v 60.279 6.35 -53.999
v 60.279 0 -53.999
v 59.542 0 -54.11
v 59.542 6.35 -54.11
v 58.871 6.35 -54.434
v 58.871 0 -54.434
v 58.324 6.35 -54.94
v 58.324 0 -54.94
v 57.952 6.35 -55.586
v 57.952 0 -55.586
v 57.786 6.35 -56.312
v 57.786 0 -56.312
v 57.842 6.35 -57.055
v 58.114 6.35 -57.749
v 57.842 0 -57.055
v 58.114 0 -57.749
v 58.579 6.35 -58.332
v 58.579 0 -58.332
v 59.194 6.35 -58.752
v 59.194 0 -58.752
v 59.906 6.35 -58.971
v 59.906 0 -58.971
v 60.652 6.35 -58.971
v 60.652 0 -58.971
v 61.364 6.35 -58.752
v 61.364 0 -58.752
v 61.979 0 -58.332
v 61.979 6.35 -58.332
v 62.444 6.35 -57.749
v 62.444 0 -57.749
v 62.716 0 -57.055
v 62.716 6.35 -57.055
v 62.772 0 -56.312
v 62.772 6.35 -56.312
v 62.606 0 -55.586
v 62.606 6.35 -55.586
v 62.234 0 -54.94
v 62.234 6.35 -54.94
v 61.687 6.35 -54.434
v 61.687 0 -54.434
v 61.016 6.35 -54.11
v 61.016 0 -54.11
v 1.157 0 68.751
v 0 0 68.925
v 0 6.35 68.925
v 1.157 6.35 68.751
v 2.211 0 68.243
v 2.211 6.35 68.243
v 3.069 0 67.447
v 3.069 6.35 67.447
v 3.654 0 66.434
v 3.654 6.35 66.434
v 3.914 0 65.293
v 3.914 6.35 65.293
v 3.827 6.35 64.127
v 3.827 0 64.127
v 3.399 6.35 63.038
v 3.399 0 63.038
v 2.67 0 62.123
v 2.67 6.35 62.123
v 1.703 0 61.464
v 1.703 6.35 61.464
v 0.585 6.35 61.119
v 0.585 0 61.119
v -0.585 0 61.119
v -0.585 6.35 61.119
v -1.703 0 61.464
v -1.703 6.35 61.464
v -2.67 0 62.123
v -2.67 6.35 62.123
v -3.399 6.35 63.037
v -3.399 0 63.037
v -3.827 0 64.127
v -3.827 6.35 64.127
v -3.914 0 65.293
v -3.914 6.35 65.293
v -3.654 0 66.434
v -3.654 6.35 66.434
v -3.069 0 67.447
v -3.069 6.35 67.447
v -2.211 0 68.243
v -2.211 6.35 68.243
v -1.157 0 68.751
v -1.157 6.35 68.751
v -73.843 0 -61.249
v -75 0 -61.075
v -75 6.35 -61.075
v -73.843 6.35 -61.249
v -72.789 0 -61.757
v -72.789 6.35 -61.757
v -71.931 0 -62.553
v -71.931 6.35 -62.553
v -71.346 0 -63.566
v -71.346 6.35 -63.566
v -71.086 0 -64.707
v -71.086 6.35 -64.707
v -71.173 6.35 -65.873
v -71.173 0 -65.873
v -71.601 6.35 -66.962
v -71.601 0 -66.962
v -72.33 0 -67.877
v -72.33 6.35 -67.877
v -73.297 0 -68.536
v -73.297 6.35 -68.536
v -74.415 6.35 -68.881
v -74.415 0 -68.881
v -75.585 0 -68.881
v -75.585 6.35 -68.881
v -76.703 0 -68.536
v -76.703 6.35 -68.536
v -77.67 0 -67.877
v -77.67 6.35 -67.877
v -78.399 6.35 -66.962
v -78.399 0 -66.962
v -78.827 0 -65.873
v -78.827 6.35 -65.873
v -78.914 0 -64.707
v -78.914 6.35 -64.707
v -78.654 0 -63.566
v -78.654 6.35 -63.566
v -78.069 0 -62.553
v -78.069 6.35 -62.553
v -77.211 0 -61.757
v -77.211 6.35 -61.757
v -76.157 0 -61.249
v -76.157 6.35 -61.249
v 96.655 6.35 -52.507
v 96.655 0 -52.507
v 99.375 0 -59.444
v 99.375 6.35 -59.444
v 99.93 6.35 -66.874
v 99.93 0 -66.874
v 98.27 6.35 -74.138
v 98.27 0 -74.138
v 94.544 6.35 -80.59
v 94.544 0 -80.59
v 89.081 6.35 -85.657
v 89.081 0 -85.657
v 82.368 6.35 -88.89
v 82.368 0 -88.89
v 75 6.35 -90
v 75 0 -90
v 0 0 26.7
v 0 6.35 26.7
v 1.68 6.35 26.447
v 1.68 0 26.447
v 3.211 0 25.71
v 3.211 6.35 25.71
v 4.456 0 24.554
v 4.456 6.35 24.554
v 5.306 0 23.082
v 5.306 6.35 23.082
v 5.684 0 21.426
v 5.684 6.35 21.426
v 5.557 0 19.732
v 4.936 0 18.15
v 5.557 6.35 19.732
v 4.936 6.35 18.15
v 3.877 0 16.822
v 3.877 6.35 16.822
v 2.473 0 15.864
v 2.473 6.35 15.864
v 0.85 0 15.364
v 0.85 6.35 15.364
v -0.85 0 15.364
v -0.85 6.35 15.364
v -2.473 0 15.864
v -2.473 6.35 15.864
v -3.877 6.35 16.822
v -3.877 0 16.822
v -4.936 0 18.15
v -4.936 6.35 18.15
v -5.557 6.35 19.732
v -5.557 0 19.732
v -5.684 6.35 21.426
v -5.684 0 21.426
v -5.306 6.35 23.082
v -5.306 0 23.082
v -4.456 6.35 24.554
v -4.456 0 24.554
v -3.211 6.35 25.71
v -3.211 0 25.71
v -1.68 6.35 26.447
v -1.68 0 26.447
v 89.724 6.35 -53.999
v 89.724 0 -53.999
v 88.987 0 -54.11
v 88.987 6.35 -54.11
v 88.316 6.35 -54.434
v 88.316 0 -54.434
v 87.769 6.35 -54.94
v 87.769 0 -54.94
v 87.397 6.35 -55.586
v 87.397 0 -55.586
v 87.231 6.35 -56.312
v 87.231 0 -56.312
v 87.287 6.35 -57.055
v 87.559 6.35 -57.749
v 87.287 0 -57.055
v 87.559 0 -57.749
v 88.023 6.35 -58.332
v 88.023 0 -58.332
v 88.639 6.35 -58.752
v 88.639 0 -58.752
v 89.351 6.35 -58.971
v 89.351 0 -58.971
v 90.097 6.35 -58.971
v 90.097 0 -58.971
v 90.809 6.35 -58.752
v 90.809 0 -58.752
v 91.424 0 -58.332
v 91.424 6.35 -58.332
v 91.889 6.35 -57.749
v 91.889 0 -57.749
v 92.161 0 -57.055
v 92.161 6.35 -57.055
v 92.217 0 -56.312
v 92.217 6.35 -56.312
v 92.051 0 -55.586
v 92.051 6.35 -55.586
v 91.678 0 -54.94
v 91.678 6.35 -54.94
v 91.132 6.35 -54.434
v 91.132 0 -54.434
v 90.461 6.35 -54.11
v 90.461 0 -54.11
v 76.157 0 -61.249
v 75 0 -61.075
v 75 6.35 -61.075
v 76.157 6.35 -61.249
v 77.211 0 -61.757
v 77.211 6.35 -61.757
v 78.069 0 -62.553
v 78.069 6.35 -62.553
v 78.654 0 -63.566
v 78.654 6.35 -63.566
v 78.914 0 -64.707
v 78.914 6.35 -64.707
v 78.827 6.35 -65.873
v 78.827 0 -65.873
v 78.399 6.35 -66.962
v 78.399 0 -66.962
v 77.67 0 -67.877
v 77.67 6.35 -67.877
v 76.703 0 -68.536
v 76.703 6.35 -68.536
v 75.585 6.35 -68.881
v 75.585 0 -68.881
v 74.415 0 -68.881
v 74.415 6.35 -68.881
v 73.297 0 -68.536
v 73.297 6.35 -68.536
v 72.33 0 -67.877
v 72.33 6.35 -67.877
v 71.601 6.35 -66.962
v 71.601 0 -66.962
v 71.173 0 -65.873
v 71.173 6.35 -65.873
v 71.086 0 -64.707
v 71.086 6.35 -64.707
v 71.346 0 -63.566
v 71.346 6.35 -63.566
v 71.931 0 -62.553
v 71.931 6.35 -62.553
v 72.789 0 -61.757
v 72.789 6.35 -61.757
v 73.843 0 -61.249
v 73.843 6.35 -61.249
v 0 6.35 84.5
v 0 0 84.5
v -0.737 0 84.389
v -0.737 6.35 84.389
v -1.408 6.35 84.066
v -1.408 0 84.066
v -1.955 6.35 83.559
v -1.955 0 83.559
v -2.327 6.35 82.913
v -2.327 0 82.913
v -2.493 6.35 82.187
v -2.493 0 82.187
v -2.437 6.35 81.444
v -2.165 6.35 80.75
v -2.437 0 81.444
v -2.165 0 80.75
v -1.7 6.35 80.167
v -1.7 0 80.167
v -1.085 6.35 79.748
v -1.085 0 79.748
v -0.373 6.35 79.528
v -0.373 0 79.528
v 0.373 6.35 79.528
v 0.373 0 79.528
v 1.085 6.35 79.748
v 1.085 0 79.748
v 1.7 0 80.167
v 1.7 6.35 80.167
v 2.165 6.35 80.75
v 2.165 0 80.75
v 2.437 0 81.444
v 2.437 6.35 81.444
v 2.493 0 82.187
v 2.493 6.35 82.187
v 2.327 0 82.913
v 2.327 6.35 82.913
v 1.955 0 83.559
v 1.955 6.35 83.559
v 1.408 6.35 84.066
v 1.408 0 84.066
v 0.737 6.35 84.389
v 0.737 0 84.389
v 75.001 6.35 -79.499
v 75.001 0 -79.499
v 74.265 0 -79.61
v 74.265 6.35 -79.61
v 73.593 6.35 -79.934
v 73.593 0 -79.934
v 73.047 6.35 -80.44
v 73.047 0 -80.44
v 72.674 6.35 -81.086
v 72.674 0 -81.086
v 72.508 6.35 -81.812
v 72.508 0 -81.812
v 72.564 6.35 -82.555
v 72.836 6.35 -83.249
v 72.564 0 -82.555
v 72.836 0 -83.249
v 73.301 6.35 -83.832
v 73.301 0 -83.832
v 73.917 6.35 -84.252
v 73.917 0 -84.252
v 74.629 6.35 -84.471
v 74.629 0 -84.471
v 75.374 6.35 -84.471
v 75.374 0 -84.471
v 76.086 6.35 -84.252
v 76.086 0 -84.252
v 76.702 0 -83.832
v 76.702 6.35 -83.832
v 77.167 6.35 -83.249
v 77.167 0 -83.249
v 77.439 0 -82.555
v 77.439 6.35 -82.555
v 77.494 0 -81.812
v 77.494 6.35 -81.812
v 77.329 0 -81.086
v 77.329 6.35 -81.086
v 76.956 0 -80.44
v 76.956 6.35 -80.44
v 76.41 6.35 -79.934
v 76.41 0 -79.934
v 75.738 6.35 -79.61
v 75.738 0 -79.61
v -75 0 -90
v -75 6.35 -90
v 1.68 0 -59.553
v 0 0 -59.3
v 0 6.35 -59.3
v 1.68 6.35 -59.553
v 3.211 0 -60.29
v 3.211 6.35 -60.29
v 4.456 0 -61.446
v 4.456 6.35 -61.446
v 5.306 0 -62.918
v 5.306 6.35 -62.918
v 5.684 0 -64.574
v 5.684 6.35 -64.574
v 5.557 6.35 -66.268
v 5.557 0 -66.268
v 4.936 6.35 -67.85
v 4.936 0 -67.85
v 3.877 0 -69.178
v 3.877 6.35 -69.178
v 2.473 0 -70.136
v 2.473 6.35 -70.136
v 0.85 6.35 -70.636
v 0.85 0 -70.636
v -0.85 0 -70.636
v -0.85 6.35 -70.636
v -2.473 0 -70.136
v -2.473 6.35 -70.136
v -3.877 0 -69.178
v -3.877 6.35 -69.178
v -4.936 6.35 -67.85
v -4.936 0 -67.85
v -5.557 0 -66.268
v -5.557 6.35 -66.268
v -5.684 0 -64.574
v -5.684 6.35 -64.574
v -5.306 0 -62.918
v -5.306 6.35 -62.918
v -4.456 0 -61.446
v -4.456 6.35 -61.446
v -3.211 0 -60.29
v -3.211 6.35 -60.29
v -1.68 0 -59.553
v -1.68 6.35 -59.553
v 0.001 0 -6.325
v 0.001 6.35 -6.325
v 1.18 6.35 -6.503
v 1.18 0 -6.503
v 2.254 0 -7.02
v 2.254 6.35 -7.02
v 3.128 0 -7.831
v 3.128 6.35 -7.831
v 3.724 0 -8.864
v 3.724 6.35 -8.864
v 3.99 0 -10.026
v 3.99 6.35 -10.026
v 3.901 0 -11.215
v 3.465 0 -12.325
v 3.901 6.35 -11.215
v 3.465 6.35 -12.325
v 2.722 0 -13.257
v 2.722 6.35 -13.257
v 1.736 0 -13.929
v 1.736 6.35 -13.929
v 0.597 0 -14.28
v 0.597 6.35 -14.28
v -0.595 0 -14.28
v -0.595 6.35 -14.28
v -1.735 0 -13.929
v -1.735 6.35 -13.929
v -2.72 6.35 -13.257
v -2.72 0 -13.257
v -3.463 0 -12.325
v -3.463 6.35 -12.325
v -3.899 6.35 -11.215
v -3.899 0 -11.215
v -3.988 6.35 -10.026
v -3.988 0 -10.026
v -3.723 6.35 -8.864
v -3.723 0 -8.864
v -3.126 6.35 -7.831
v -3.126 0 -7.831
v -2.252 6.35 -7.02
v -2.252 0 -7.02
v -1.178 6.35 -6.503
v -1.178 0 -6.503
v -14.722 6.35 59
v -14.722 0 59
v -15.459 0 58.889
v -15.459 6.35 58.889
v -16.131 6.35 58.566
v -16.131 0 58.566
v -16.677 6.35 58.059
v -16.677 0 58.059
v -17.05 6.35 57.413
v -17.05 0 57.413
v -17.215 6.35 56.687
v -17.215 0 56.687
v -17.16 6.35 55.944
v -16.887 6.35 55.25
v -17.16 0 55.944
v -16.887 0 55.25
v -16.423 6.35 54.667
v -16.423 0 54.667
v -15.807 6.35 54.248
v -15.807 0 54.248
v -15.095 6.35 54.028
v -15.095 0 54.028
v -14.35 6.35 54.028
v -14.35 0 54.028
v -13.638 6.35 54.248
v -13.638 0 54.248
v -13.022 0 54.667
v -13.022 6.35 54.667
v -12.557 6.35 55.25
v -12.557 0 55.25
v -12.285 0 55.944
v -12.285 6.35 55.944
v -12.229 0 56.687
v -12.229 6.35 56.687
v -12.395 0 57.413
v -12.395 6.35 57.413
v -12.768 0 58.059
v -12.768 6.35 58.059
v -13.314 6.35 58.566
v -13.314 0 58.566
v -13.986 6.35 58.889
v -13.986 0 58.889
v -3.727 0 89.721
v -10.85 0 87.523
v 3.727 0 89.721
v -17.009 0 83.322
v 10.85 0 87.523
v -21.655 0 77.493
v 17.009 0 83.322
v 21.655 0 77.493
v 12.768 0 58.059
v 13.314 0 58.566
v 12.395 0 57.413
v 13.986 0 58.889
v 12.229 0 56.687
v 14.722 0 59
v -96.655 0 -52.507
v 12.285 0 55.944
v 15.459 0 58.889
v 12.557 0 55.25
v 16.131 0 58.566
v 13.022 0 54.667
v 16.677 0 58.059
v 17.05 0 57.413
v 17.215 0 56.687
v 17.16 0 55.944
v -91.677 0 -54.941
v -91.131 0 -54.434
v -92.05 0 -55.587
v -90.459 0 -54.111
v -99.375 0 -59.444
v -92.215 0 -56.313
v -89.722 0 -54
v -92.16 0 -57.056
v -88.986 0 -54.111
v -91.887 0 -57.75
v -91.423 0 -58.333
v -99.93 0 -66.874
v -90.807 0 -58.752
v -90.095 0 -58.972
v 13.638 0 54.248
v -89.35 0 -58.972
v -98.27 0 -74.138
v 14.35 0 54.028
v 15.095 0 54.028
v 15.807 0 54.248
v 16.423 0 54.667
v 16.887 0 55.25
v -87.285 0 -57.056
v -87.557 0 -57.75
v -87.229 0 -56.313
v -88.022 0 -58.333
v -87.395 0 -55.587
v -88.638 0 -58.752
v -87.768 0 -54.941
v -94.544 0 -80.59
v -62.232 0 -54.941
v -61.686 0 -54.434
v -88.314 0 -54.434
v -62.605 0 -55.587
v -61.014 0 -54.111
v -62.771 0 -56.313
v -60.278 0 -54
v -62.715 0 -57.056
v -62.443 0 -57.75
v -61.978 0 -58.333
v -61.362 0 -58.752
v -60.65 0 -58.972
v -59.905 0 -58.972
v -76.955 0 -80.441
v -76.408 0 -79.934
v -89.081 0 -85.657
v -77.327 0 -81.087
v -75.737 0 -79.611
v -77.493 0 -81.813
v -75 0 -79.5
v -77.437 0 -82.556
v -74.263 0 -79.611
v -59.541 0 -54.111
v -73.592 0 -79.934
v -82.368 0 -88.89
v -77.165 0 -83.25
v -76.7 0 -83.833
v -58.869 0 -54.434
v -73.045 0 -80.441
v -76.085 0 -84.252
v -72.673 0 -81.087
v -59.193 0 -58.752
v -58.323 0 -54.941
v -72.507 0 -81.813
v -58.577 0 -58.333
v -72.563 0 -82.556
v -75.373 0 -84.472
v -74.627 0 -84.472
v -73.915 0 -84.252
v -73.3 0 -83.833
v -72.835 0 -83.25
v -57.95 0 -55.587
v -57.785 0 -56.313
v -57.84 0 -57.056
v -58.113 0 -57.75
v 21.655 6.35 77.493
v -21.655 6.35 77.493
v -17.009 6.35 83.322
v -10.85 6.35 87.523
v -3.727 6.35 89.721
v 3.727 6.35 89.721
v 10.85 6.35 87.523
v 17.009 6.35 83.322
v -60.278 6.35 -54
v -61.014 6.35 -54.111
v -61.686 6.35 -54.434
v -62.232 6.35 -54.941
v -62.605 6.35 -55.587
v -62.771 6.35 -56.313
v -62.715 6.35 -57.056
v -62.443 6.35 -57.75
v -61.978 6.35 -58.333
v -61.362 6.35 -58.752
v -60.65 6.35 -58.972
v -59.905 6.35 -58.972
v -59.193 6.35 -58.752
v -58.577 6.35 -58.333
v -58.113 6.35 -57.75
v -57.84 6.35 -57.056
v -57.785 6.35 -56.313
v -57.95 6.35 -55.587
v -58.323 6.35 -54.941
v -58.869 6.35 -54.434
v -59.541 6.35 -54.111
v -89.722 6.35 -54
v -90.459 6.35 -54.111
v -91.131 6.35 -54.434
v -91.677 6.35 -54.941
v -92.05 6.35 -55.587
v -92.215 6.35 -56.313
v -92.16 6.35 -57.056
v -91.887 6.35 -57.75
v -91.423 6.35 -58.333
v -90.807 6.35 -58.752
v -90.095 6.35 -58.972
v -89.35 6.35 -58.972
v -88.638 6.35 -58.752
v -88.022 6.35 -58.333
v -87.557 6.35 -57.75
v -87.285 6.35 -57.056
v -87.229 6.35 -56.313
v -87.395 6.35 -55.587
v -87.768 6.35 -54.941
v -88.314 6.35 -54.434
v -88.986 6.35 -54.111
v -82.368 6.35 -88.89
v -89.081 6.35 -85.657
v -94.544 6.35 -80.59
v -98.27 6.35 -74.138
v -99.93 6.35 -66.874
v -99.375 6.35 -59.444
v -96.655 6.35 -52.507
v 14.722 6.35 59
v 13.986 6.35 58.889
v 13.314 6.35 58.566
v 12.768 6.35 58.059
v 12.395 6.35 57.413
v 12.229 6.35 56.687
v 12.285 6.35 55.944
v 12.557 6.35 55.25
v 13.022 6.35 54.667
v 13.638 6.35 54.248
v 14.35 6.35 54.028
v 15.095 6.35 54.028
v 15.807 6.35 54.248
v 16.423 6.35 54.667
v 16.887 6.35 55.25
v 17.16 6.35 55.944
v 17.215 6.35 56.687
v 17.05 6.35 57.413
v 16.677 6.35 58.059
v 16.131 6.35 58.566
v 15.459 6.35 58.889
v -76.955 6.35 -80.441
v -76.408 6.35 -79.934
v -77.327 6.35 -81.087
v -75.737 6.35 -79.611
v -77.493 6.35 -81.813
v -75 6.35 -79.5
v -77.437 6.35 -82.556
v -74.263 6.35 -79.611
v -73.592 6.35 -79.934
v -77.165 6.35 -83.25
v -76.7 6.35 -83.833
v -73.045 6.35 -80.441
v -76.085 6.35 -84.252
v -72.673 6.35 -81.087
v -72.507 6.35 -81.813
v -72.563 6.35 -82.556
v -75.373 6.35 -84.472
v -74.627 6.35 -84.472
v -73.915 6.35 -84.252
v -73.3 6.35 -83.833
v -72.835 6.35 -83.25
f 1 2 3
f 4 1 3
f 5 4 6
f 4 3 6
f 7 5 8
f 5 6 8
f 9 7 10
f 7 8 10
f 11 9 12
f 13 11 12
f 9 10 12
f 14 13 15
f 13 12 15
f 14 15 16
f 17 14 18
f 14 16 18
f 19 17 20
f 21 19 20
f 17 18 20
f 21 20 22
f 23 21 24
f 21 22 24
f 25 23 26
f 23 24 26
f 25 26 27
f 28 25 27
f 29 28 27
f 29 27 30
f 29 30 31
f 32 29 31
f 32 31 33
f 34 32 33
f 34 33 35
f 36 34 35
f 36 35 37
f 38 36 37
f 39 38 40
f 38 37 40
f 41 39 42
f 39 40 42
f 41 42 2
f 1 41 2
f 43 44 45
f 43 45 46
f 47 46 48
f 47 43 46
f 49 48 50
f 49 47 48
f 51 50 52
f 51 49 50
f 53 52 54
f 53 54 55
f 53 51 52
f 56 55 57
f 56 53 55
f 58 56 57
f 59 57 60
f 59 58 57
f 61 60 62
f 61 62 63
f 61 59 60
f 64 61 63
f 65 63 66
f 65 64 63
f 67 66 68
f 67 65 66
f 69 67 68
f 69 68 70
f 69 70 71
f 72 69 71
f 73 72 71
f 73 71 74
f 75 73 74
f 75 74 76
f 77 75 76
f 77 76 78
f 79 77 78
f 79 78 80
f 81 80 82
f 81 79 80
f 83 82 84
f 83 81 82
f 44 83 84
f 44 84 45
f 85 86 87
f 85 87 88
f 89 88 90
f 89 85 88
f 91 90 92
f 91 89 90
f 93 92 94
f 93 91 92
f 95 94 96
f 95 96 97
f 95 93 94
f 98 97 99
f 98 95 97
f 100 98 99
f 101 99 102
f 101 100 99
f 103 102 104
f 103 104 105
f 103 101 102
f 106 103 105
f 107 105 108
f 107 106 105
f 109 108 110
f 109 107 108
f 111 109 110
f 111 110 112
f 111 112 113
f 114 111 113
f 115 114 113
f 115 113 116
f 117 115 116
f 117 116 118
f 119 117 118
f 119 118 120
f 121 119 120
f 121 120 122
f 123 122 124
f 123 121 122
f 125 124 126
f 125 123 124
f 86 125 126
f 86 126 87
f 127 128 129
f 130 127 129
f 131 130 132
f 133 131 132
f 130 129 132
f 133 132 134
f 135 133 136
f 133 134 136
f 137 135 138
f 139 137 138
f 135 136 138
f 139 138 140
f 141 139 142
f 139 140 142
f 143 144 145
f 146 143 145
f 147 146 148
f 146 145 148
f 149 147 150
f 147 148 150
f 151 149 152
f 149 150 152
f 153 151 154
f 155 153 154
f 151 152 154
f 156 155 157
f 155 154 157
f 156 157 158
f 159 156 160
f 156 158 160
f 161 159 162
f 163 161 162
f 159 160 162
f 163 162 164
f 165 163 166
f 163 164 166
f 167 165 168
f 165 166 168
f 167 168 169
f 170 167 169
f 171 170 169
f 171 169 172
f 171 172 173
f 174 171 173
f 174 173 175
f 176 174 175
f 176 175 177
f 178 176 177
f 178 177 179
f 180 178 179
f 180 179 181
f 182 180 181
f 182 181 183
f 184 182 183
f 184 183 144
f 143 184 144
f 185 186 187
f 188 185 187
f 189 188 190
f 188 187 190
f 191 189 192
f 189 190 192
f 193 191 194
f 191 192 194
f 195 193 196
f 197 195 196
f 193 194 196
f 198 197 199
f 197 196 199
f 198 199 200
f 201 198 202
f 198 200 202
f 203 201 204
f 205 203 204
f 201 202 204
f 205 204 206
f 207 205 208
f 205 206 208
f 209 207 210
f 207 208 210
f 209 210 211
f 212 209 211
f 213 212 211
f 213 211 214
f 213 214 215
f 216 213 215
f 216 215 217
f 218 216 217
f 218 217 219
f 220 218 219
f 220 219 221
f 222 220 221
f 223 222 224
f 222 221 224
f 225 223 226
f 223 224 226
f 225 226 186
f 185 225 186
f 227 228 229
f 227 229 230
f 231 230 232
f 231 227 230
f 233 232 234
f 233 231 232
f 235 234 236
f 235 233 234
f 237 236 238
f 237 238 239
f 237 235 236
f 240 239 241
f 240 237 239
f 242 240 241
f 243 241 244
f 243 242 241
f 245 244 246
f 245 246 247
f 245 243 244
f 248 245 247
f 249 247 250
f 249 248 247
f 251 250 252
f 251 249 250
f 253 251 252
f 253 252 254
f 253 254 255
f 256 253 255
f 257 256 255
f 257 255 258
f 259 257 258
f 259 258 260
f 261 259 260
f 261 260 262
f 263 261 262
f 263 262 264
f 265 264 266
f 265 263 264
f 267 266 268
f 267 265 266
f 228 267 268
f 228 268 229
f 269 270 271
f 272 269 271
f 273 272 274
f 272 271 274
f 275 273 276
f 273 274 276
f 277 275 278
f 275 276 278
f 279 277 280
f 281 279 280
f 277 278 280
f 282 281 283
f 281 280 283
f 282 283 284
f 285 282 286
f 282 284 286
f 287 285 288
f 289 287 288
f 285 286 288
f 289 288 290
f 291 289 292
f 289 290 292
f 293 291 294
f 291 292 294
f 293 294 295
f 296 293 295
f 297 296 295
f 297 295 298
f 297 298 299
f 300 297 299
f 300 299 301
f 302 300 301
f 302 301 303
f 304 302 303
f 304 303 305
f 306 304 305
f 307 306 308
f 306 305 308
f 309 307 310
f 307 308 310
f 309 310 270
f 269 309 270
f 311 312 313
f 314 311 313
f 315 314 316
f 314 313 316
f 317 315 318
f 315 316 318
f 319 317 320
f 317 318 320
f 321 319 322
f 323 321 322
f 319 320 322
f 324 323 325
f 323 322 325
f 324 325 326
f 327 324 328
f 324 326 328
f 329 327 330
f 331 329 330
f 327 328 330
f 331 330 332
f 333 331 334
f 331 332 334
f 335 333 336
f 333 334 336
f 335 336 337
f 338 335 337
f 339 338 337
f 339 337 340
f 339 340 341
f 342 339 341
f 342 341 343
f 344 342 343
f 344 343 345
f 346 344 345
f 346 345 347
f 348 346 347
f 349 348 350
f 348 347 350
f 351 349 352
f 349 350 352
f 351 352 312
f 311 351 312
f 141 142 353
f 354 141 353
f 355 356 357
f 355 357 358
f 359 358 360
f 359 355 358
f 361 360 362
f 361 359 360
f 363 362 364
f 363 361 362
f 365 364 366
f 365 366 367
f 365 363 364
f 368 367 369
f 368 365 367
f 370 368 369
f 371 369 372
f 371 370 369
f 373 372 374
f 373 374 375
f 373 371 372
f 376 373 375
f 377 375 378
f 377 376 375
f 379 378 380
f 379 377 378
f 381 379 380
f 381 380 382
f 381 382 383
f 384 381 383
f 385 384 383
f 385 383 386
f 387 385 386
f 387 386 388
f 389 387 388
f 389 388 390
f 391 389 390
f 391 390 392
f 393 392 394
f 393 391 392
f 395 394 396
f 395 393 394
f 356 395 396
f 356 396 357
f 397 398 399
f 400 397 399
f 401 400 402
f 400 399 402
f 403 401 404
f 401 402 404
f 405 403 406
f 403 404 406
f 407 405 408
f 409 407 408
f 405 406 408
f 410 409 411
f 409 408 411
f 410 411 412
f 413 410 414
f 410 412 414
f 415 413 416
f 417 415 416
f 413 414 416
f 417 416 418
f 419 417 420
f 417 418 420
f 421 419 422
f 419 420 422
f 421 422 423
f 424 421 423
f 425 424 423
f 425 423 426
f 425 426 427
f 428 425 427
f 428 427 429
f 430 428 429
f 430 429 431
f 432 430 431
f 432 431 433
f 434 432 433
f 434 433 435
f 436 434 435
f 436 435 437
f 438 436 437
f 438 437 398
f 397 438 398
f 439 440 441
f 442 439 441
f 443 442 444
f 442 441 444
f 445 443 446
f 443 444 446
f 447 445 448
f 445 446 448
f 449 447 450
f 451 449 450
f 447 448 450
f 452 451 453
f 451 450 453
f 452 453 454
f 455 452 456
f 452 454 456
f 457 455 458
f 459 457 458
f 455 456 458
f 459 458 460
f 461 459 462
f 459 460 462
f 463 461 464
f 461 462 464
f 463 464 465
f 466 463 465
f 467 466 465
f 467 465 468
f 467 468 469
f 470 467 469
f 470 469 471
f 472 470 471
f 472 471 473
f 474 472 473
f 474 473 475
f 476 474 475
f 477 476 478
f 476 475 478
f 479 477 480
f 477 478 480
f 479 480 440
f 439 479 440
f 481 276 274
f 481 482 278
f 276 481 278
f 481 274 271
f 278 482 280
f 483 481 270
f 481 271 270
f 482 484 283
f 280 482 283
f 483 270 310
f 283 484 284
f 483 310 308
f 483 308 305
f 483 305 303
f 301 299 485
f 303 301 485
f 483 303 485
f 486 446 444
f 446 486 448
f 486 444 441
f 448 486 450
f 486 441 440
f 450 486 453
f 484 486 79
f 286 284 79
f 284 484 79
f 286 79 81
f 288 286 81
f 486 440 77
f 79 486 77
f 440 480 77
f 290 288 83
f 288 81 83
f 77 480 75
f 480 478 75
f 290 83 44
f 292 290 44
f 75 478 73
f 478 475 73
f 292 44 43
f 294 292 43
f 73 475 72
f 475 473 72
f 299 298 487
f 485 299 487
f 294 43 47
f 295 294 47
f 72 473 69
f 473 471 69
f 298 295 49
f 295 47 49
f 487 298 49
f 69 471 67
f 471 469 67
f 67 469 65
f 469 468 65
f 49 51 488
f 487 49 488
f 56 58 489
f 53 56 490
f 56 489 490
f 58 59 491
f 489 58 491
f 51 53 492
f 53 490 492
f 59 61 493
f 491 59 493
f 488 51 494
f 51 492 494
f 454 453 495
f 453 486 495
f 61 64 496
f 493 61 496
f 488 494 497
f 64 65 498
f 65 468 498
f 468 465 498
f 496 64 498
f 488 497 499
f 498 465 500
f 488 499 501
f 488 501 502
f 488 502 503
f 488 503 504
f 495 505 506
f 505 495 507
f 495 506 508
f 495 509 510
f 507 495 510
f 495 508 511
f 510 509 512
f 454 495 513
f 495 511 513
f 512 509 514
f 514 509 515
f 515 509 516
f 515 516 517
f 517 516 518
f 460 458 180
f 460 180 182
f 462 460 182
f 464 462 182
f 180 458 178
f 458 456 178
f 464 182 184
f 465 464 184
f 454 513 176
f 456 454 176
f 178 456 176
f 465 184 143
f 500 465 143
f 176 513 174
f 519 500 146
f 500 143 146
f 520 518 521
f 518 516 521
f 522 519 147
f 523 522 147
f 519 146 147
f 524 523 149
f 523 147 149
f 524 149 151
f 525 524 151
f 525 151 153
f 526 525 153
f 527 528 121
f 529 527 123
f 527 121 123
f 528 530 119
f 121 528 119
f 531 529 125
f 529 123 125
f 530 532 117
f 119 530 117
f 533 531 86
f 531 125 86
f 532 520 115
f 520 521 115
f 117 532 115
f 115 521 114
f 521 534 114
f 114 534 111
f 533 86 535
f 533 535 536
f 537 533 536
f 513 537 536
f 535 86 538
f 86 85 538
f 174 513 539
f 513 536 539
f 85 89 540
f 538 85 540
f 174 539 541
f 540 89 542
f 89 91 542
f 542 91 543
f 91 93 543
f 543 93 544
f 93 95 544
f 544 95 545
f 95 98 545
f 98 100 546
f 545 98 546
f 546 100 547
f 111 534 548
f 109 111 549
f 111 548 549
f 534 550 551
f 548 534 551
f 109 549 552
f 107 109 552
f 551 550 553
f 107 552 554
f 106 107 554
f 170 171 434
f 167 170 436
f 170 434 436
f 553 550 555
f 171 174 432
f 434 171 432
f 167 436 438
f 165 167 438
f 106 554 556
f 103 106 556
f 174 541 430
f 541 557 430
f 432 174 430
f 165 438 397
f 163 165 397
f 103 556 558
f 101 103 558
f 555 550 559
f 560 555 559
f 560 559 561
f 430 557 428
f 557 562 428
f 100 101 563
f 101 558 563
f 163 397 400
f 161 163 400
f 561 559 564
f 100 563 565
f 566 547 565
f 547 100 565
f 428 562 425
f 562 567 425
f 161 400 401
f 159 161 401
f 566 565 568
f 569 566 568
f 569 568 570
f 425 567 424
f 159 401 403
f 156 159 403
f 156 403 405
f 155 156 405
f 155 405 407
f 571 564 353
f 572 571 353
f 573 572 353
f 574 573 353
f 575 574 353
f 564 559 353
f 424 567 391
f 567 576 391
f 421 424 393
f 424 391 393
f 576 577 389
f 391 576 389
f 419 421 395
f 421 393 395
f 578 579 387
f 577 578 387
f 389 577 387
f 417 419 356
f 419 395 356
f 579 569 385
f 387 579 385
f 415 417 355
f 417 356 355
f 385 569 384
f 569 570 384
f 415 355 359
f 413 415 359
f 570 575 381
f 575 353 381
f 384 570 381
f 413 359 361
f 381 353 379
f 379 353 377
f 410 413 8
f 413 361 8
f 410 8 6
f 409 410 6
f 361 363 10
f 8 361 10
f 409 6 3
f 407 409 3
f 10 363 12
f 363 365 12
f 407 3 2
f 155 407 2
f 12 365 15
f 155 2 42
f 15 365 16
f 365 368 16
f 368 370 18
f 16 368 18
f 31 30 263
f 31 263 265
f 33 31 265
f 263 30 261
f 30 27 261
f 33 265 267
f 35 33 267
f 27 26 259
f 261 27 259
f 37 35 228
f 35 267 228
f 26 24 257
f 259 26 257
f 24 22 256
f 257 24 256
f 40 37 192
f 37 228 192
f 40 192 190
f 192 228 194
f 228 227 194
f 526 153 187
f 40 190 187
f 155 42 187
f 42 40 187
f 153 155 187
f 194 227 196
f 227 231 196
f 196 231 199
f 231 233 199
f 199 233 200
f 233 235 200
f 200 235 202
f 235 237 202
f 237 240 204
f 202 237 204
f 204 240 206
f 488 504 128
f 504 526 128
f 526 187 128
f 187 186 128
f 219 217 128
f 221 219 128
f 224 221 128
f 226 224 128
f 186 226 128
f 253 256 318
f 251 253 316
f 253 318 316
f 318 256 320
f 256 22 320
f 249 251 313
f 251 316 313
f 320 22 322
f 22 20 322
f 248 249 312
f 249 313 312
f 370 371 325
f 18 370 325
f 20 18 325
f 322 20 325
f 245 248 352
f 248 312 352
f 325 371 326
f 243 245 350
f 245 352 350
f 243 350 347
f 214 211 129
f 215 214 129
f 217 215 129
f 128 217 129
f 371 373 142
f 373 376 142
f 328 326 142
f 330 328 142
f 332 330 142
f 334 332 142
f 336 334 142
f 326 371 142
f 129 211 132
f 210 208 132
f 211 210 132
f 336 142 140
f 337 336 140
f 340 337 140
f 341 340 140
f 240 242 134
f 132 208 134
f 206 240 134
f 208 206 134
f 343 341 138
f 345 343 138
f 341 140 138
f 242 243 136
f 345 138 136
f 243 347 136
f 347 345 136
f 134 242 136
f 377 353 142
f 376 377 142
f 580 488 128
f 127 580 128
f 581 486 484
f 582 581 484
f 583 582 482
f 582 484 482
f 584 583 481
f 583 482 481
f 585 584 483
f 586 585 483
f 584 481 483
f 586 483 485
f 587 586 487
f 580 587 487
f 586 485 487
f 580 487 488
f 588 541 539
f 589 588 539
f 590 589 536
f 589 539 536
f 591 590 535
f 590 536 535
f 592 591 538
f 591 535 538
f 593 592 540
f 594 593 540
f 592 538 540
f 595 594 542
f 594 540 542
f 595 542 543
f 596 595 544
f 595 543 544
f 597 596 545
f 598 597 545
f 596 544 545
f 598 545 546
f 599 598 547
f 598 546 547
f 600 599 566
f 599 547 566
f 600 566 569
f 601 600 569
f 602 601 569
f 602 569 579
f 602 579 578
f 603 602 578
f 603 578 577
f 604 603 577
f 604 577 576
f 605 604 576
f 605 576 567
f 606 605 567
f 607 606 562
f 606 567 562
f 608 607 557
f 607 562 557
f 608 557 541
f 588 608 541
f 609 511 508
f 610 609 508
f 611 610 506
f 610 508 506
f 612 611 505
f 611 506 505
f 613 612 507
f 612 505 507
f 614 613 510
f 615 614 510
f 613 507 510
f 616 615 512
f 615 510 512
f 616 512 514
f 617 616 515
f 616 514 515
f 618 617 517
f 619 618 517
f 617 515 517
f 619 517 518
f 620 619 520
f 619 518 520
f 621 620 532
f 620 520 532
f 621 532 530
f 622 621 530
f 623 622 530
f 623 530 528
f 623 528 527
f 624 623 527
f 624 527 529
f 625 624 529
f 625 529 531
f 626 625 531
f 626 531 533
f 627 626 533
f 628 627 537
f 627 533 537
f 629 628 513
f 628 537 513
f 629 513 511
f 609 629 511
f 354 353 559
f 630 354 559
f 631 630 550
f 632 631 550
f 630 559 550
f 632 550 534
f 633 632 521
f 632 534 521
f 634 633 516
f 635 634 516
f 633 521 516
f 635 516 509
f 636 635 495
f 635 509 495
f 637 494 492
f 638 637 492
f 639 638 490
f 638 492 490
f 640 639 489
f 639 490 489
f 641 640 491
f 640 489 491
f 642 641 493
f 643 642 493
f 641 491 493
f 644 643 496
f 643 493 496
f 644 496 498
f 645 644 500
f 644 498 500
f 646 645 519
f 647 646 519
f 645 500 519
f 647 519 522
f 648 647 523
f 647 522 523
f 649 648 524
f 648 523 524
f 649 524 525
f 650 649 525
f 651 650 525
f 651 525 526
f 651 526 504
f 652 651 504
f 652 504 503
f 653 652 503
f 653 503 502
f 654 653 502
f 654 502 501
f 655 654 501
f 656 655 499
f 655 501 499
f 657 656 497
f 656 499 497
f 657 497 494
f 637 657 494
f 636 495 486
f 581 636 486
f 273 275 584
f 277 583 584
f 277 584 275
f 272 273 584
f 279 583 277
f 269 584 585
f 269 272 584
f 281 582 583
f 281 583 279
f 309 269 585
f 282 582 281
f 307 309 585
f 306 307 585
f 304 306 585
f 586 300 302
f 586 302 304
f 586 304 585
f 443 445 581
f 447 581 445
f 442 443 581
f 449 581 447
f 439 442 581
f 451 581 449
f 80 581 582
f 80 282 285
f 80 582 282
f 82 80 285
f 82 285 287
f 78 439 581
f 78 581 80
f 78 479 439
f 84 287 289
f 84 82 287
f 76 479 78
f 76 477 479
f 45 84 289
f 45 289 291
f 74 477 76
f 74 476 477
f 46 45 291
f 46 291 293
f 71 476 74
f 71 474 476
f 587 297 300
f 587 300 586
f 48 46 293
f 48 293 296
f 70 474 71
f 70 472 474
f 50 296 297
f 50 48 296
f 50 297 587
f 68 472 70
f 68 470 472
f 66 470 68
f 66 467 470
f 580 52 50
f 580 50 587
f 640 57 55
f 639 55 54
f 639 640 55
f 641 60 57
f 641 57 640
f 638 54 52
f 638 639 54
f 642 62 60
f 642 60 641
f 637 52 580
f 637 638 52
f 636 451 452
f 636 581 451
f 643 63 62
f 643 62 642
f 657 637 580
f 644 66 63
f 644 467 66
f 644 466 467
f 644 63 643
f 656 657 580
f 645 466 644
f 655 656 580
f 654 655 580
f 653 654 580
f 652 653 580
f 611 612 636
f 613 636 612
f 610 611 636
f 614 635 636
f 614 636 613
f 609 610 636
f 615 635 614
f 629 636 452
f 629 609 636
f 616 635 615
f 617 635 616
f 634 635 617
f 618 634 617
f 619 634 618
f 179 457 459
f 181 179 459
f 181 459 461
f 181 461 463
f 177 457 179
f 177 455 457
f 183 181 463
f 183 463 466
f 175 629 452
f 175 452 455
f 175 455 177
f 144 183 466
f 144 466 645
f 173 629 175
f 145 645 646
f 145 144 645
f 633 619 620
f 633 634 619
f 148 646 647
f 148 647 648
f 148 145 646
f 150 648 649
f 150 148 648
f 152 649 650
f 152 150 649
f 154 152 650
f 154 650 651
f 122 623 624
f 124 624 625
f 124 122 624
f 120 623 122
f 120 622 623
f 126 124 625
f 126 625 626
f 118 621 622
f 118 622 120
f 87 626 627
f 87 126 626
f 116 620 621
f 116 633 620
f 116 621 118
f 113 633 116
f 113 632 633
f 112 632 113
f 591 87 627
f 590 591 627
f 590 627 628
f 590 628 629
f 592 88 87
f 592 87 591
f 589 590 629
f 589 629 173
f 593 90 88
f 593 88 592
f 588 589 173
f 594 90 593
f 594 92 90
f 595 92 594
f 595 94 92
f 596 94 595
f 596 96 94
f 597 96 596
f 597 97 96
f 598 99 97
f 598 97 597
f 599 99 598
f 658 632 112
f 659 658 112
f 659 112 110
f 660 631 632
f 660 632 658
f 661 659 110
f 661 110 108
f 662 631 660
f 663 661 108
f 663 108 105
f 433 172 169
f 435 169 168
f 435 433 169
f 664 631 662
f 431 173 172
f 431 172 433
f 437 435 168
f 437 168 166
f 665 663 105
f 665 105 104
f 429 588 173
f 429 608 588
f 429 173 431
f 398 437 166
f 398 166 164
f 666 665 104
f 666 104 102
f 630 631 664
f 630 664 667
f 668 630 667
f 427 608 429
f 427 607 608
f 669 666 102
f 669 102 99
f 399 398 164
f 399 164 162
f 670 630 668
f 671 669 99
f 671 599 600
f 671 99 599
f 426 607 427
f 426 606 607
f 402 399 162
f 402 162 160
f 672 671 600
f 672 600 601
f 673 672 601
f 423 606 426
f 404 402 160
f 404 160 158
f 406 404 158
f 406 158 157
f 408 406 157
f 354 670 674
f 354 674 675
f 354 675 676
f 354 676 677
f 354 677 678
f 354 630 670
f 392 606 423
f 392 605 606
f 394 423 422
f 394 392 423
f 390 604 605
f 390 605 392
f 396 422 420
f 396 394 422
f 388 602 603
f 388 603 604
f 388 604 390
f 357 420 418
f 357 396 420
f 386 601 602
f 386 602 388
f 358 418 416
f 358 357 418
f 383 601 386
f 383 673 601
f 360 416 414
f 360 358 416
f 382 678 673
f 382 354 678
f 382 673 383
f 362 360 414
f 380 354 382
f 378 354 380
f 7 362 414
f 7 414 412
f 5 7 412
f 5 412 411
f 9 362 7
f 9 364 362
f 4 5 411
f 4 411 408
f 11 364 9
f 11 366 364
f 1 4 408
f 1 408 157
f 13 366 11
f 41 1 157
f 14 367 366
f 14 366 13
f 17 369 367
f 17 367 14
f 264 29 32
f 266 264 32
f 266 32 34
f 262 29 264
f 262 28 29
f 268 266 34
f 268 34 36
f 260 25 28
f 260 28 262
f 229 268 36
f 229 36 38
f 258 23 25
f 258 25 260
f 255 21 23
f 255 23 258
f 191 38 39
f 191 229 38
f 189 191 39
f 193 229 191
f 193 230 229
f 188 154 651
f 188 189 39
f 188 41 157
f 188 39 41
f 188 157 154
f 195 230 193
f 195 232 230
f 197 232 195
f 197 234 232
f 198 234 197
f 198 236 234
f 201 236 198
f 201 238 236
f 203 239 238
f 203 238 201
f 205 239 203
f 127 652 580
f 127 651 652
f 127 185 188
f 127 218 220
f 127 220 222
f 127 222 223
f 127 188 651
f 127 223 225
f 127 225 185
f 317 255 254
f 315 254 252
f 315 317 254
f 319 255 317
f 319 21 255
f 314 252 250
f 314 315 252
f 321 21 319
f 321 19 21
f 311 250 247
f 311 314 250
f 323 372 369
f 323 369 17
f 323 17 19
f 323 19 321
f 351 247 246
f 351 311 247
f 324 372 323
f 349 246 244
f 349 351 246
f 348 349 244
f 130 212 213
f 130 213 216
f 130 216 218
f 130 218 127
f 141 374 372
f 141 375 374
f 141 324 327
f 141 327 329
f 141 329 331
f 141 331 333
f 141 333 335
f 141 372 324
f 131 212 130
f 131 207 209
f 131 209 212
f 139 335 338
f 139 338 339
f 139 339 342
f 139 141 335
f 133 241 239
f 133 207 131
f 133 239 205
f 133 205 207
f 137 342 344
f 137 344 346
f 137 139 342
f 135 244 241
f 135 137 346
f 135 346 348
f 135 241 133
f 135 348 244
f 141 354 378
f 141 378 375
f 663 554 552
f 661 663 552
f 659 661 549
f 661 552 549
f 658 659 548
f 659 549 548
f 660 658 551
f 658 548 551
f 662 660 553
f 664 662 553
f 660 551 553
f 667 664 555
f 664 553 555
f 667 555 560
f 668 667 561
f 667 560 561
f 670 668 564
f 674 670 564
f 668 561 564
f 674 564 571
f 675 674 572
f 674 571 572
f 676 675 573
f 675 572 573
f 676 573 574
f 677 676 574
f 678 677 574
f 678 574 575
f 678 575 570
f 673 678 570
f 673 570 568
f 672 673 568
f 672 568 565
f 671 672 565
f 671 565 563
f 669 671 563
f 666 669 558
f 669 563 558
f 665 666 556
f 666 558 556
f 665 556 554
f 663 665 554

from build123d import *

# Parameters (mm, degrees)
ESQUISSE1_R             = 5.7
ESQUISSE1_R_2           = 3.925
BOSS_EXTRU_1_DEPTH      = 6.35
ESQUISSE4_R             = 2.5
ENL_V_MAT_EXTRU_1_DEPTH = 6.35
ESQUISSE5_R             = 4
ENL_V_MAT_EXTRU_2_DEPTH = 135.686014493
ESQUISSE6_R             = 5.7
ENL_V_MAT_EXTRU_3_DEPTH = 135.686014493


with BuildPart() as part:
    # Esquisse1 → Boss.-Extru.1 (new body)
    with BuildSketch(Plane(origin=(0, 0, 0), x_dir=(1, 0, 0), z_dir=(0, 1, 0))):
        with BuildLine():
            Line((-96.654639651, 52.506938663), (-21.654639651, -77.493061337))
            ThreePointArc((-21.654639651, -77.493061337), (0, -90), (21.654639651, -77.493061337))
            Line((21.654639651, -77.493061337), (96.654639651, 52.506938663))
            ThreePointArc((96.654639651, 52.506938663), (96.648631983, 77.50346885), (75, 90))
            Line((75, 90), (-75, 90))
            ThreePointArc((-75, 90), (-96.648631983, 77.50346885), (-96.654639651, 52.506938663))
        make_face()
        with Locations(Location((0, 65, 0), (0, 0, 270))):
            Circle(ESQUISSE1_R, mode=Mode.SUBTRACT)
        with Locations(Location((-75, 65, 0), (0, 0, 270))):
            Circle(ESQUISSE1_R_2, mode=Mode.SUBTRACT)
        with Locations(Location((75, 65, 0), (0, 0, 270))):
            Circle(ESQUISSE1_R_2, mode=Mode.SUBTRACT)
        with Locations(Location((0, -65, 0), (0, 0, 270))):
            Circle(ESQUISSE1_R_2, mode=Mode.SUBTRACT)
    extrude(amount=BOSS_EXTRU_1_DEPTH)

    # Esquisse4 → Enlèv. mat.-Extru.1 (cut)
    with BuildSketch(Plane.XZ):
        with Locations(Location((-75, -82, 0), (0, 0, 90))):
            Circle(ESQUISSE4_R)
        with Locations(Location((-89.722431864, -56.5, 0), (0, 0, 90))):
            Circle(ESQUISSE4_R)
        with Locations(Location((-60.277568136, -56.5, 0), (0, 0, 90))):
            Circle(ESQUISSE4_R)
        with Locations(Location((60.27903399, -56.499154304, 0), (0, 0, 90))):
            Circle(ESQUISSE4_R)
        with Locations(Location((75.001465855, -81.999154304, 0), (0, 0, 90))):
            Circle(ESQUISSE4_R)
        with Locations(Location((89.723897719, -56.499154304, 0), (0, 0, 90))):
            Circle(ESQUISSE4_R)
        with Locations(Location((14.722431864, 56.5, 0), (0, 0, 90))):
            Circle(ESQUISSE4_R)
        with Locations(Location((0, 82, 0), (0, 0, 90))):
            Circle(ESQUISSE4_R)
        with Locations(Location((-14.722431864, 56.5, 0), (0, 0, 90))):
            Circle(ESQUISSE4_R)
    extrude(amount=-ENL_V_MAT_EXTRU_1_DEPTH, mode=Mode.SUBTRACT)

    # Esquisse5 → Enlèv. mat.-Extru.2 (cut, through all)
    with BuildSketch(Plane(origin=(0, 6.35, 0), x_dir=(1, 0, 0), z_dir=(0, 1, 0))):
        with Locations(Location((0.000849353, 10.324999995, 0), (0, 0, 270))):
            Circle(ESQUISSE5_R)
    extrude(amount=-ENL_V_MAT_EXTRU_2_DEPTH, mode=Mode.SUBTRACT)

    # Esquisse6 → Enlèv. mat.-Extru.3 (cut, through all)
    with BuildSketch(Plane(origin=(0, 6.35, 0), x_dir=(1, 0, 0), z_dir=(0, 1, 0))):
        with Locations(Location((0, -21, 0), (0, 0, 270))):
            Circle(ESQUISSE6_R)
    extrude(amount=-ENL_V_MAT_EXTRU_3_DEPTH, mode=Mode.SUBTRACT)


solid = part.part
